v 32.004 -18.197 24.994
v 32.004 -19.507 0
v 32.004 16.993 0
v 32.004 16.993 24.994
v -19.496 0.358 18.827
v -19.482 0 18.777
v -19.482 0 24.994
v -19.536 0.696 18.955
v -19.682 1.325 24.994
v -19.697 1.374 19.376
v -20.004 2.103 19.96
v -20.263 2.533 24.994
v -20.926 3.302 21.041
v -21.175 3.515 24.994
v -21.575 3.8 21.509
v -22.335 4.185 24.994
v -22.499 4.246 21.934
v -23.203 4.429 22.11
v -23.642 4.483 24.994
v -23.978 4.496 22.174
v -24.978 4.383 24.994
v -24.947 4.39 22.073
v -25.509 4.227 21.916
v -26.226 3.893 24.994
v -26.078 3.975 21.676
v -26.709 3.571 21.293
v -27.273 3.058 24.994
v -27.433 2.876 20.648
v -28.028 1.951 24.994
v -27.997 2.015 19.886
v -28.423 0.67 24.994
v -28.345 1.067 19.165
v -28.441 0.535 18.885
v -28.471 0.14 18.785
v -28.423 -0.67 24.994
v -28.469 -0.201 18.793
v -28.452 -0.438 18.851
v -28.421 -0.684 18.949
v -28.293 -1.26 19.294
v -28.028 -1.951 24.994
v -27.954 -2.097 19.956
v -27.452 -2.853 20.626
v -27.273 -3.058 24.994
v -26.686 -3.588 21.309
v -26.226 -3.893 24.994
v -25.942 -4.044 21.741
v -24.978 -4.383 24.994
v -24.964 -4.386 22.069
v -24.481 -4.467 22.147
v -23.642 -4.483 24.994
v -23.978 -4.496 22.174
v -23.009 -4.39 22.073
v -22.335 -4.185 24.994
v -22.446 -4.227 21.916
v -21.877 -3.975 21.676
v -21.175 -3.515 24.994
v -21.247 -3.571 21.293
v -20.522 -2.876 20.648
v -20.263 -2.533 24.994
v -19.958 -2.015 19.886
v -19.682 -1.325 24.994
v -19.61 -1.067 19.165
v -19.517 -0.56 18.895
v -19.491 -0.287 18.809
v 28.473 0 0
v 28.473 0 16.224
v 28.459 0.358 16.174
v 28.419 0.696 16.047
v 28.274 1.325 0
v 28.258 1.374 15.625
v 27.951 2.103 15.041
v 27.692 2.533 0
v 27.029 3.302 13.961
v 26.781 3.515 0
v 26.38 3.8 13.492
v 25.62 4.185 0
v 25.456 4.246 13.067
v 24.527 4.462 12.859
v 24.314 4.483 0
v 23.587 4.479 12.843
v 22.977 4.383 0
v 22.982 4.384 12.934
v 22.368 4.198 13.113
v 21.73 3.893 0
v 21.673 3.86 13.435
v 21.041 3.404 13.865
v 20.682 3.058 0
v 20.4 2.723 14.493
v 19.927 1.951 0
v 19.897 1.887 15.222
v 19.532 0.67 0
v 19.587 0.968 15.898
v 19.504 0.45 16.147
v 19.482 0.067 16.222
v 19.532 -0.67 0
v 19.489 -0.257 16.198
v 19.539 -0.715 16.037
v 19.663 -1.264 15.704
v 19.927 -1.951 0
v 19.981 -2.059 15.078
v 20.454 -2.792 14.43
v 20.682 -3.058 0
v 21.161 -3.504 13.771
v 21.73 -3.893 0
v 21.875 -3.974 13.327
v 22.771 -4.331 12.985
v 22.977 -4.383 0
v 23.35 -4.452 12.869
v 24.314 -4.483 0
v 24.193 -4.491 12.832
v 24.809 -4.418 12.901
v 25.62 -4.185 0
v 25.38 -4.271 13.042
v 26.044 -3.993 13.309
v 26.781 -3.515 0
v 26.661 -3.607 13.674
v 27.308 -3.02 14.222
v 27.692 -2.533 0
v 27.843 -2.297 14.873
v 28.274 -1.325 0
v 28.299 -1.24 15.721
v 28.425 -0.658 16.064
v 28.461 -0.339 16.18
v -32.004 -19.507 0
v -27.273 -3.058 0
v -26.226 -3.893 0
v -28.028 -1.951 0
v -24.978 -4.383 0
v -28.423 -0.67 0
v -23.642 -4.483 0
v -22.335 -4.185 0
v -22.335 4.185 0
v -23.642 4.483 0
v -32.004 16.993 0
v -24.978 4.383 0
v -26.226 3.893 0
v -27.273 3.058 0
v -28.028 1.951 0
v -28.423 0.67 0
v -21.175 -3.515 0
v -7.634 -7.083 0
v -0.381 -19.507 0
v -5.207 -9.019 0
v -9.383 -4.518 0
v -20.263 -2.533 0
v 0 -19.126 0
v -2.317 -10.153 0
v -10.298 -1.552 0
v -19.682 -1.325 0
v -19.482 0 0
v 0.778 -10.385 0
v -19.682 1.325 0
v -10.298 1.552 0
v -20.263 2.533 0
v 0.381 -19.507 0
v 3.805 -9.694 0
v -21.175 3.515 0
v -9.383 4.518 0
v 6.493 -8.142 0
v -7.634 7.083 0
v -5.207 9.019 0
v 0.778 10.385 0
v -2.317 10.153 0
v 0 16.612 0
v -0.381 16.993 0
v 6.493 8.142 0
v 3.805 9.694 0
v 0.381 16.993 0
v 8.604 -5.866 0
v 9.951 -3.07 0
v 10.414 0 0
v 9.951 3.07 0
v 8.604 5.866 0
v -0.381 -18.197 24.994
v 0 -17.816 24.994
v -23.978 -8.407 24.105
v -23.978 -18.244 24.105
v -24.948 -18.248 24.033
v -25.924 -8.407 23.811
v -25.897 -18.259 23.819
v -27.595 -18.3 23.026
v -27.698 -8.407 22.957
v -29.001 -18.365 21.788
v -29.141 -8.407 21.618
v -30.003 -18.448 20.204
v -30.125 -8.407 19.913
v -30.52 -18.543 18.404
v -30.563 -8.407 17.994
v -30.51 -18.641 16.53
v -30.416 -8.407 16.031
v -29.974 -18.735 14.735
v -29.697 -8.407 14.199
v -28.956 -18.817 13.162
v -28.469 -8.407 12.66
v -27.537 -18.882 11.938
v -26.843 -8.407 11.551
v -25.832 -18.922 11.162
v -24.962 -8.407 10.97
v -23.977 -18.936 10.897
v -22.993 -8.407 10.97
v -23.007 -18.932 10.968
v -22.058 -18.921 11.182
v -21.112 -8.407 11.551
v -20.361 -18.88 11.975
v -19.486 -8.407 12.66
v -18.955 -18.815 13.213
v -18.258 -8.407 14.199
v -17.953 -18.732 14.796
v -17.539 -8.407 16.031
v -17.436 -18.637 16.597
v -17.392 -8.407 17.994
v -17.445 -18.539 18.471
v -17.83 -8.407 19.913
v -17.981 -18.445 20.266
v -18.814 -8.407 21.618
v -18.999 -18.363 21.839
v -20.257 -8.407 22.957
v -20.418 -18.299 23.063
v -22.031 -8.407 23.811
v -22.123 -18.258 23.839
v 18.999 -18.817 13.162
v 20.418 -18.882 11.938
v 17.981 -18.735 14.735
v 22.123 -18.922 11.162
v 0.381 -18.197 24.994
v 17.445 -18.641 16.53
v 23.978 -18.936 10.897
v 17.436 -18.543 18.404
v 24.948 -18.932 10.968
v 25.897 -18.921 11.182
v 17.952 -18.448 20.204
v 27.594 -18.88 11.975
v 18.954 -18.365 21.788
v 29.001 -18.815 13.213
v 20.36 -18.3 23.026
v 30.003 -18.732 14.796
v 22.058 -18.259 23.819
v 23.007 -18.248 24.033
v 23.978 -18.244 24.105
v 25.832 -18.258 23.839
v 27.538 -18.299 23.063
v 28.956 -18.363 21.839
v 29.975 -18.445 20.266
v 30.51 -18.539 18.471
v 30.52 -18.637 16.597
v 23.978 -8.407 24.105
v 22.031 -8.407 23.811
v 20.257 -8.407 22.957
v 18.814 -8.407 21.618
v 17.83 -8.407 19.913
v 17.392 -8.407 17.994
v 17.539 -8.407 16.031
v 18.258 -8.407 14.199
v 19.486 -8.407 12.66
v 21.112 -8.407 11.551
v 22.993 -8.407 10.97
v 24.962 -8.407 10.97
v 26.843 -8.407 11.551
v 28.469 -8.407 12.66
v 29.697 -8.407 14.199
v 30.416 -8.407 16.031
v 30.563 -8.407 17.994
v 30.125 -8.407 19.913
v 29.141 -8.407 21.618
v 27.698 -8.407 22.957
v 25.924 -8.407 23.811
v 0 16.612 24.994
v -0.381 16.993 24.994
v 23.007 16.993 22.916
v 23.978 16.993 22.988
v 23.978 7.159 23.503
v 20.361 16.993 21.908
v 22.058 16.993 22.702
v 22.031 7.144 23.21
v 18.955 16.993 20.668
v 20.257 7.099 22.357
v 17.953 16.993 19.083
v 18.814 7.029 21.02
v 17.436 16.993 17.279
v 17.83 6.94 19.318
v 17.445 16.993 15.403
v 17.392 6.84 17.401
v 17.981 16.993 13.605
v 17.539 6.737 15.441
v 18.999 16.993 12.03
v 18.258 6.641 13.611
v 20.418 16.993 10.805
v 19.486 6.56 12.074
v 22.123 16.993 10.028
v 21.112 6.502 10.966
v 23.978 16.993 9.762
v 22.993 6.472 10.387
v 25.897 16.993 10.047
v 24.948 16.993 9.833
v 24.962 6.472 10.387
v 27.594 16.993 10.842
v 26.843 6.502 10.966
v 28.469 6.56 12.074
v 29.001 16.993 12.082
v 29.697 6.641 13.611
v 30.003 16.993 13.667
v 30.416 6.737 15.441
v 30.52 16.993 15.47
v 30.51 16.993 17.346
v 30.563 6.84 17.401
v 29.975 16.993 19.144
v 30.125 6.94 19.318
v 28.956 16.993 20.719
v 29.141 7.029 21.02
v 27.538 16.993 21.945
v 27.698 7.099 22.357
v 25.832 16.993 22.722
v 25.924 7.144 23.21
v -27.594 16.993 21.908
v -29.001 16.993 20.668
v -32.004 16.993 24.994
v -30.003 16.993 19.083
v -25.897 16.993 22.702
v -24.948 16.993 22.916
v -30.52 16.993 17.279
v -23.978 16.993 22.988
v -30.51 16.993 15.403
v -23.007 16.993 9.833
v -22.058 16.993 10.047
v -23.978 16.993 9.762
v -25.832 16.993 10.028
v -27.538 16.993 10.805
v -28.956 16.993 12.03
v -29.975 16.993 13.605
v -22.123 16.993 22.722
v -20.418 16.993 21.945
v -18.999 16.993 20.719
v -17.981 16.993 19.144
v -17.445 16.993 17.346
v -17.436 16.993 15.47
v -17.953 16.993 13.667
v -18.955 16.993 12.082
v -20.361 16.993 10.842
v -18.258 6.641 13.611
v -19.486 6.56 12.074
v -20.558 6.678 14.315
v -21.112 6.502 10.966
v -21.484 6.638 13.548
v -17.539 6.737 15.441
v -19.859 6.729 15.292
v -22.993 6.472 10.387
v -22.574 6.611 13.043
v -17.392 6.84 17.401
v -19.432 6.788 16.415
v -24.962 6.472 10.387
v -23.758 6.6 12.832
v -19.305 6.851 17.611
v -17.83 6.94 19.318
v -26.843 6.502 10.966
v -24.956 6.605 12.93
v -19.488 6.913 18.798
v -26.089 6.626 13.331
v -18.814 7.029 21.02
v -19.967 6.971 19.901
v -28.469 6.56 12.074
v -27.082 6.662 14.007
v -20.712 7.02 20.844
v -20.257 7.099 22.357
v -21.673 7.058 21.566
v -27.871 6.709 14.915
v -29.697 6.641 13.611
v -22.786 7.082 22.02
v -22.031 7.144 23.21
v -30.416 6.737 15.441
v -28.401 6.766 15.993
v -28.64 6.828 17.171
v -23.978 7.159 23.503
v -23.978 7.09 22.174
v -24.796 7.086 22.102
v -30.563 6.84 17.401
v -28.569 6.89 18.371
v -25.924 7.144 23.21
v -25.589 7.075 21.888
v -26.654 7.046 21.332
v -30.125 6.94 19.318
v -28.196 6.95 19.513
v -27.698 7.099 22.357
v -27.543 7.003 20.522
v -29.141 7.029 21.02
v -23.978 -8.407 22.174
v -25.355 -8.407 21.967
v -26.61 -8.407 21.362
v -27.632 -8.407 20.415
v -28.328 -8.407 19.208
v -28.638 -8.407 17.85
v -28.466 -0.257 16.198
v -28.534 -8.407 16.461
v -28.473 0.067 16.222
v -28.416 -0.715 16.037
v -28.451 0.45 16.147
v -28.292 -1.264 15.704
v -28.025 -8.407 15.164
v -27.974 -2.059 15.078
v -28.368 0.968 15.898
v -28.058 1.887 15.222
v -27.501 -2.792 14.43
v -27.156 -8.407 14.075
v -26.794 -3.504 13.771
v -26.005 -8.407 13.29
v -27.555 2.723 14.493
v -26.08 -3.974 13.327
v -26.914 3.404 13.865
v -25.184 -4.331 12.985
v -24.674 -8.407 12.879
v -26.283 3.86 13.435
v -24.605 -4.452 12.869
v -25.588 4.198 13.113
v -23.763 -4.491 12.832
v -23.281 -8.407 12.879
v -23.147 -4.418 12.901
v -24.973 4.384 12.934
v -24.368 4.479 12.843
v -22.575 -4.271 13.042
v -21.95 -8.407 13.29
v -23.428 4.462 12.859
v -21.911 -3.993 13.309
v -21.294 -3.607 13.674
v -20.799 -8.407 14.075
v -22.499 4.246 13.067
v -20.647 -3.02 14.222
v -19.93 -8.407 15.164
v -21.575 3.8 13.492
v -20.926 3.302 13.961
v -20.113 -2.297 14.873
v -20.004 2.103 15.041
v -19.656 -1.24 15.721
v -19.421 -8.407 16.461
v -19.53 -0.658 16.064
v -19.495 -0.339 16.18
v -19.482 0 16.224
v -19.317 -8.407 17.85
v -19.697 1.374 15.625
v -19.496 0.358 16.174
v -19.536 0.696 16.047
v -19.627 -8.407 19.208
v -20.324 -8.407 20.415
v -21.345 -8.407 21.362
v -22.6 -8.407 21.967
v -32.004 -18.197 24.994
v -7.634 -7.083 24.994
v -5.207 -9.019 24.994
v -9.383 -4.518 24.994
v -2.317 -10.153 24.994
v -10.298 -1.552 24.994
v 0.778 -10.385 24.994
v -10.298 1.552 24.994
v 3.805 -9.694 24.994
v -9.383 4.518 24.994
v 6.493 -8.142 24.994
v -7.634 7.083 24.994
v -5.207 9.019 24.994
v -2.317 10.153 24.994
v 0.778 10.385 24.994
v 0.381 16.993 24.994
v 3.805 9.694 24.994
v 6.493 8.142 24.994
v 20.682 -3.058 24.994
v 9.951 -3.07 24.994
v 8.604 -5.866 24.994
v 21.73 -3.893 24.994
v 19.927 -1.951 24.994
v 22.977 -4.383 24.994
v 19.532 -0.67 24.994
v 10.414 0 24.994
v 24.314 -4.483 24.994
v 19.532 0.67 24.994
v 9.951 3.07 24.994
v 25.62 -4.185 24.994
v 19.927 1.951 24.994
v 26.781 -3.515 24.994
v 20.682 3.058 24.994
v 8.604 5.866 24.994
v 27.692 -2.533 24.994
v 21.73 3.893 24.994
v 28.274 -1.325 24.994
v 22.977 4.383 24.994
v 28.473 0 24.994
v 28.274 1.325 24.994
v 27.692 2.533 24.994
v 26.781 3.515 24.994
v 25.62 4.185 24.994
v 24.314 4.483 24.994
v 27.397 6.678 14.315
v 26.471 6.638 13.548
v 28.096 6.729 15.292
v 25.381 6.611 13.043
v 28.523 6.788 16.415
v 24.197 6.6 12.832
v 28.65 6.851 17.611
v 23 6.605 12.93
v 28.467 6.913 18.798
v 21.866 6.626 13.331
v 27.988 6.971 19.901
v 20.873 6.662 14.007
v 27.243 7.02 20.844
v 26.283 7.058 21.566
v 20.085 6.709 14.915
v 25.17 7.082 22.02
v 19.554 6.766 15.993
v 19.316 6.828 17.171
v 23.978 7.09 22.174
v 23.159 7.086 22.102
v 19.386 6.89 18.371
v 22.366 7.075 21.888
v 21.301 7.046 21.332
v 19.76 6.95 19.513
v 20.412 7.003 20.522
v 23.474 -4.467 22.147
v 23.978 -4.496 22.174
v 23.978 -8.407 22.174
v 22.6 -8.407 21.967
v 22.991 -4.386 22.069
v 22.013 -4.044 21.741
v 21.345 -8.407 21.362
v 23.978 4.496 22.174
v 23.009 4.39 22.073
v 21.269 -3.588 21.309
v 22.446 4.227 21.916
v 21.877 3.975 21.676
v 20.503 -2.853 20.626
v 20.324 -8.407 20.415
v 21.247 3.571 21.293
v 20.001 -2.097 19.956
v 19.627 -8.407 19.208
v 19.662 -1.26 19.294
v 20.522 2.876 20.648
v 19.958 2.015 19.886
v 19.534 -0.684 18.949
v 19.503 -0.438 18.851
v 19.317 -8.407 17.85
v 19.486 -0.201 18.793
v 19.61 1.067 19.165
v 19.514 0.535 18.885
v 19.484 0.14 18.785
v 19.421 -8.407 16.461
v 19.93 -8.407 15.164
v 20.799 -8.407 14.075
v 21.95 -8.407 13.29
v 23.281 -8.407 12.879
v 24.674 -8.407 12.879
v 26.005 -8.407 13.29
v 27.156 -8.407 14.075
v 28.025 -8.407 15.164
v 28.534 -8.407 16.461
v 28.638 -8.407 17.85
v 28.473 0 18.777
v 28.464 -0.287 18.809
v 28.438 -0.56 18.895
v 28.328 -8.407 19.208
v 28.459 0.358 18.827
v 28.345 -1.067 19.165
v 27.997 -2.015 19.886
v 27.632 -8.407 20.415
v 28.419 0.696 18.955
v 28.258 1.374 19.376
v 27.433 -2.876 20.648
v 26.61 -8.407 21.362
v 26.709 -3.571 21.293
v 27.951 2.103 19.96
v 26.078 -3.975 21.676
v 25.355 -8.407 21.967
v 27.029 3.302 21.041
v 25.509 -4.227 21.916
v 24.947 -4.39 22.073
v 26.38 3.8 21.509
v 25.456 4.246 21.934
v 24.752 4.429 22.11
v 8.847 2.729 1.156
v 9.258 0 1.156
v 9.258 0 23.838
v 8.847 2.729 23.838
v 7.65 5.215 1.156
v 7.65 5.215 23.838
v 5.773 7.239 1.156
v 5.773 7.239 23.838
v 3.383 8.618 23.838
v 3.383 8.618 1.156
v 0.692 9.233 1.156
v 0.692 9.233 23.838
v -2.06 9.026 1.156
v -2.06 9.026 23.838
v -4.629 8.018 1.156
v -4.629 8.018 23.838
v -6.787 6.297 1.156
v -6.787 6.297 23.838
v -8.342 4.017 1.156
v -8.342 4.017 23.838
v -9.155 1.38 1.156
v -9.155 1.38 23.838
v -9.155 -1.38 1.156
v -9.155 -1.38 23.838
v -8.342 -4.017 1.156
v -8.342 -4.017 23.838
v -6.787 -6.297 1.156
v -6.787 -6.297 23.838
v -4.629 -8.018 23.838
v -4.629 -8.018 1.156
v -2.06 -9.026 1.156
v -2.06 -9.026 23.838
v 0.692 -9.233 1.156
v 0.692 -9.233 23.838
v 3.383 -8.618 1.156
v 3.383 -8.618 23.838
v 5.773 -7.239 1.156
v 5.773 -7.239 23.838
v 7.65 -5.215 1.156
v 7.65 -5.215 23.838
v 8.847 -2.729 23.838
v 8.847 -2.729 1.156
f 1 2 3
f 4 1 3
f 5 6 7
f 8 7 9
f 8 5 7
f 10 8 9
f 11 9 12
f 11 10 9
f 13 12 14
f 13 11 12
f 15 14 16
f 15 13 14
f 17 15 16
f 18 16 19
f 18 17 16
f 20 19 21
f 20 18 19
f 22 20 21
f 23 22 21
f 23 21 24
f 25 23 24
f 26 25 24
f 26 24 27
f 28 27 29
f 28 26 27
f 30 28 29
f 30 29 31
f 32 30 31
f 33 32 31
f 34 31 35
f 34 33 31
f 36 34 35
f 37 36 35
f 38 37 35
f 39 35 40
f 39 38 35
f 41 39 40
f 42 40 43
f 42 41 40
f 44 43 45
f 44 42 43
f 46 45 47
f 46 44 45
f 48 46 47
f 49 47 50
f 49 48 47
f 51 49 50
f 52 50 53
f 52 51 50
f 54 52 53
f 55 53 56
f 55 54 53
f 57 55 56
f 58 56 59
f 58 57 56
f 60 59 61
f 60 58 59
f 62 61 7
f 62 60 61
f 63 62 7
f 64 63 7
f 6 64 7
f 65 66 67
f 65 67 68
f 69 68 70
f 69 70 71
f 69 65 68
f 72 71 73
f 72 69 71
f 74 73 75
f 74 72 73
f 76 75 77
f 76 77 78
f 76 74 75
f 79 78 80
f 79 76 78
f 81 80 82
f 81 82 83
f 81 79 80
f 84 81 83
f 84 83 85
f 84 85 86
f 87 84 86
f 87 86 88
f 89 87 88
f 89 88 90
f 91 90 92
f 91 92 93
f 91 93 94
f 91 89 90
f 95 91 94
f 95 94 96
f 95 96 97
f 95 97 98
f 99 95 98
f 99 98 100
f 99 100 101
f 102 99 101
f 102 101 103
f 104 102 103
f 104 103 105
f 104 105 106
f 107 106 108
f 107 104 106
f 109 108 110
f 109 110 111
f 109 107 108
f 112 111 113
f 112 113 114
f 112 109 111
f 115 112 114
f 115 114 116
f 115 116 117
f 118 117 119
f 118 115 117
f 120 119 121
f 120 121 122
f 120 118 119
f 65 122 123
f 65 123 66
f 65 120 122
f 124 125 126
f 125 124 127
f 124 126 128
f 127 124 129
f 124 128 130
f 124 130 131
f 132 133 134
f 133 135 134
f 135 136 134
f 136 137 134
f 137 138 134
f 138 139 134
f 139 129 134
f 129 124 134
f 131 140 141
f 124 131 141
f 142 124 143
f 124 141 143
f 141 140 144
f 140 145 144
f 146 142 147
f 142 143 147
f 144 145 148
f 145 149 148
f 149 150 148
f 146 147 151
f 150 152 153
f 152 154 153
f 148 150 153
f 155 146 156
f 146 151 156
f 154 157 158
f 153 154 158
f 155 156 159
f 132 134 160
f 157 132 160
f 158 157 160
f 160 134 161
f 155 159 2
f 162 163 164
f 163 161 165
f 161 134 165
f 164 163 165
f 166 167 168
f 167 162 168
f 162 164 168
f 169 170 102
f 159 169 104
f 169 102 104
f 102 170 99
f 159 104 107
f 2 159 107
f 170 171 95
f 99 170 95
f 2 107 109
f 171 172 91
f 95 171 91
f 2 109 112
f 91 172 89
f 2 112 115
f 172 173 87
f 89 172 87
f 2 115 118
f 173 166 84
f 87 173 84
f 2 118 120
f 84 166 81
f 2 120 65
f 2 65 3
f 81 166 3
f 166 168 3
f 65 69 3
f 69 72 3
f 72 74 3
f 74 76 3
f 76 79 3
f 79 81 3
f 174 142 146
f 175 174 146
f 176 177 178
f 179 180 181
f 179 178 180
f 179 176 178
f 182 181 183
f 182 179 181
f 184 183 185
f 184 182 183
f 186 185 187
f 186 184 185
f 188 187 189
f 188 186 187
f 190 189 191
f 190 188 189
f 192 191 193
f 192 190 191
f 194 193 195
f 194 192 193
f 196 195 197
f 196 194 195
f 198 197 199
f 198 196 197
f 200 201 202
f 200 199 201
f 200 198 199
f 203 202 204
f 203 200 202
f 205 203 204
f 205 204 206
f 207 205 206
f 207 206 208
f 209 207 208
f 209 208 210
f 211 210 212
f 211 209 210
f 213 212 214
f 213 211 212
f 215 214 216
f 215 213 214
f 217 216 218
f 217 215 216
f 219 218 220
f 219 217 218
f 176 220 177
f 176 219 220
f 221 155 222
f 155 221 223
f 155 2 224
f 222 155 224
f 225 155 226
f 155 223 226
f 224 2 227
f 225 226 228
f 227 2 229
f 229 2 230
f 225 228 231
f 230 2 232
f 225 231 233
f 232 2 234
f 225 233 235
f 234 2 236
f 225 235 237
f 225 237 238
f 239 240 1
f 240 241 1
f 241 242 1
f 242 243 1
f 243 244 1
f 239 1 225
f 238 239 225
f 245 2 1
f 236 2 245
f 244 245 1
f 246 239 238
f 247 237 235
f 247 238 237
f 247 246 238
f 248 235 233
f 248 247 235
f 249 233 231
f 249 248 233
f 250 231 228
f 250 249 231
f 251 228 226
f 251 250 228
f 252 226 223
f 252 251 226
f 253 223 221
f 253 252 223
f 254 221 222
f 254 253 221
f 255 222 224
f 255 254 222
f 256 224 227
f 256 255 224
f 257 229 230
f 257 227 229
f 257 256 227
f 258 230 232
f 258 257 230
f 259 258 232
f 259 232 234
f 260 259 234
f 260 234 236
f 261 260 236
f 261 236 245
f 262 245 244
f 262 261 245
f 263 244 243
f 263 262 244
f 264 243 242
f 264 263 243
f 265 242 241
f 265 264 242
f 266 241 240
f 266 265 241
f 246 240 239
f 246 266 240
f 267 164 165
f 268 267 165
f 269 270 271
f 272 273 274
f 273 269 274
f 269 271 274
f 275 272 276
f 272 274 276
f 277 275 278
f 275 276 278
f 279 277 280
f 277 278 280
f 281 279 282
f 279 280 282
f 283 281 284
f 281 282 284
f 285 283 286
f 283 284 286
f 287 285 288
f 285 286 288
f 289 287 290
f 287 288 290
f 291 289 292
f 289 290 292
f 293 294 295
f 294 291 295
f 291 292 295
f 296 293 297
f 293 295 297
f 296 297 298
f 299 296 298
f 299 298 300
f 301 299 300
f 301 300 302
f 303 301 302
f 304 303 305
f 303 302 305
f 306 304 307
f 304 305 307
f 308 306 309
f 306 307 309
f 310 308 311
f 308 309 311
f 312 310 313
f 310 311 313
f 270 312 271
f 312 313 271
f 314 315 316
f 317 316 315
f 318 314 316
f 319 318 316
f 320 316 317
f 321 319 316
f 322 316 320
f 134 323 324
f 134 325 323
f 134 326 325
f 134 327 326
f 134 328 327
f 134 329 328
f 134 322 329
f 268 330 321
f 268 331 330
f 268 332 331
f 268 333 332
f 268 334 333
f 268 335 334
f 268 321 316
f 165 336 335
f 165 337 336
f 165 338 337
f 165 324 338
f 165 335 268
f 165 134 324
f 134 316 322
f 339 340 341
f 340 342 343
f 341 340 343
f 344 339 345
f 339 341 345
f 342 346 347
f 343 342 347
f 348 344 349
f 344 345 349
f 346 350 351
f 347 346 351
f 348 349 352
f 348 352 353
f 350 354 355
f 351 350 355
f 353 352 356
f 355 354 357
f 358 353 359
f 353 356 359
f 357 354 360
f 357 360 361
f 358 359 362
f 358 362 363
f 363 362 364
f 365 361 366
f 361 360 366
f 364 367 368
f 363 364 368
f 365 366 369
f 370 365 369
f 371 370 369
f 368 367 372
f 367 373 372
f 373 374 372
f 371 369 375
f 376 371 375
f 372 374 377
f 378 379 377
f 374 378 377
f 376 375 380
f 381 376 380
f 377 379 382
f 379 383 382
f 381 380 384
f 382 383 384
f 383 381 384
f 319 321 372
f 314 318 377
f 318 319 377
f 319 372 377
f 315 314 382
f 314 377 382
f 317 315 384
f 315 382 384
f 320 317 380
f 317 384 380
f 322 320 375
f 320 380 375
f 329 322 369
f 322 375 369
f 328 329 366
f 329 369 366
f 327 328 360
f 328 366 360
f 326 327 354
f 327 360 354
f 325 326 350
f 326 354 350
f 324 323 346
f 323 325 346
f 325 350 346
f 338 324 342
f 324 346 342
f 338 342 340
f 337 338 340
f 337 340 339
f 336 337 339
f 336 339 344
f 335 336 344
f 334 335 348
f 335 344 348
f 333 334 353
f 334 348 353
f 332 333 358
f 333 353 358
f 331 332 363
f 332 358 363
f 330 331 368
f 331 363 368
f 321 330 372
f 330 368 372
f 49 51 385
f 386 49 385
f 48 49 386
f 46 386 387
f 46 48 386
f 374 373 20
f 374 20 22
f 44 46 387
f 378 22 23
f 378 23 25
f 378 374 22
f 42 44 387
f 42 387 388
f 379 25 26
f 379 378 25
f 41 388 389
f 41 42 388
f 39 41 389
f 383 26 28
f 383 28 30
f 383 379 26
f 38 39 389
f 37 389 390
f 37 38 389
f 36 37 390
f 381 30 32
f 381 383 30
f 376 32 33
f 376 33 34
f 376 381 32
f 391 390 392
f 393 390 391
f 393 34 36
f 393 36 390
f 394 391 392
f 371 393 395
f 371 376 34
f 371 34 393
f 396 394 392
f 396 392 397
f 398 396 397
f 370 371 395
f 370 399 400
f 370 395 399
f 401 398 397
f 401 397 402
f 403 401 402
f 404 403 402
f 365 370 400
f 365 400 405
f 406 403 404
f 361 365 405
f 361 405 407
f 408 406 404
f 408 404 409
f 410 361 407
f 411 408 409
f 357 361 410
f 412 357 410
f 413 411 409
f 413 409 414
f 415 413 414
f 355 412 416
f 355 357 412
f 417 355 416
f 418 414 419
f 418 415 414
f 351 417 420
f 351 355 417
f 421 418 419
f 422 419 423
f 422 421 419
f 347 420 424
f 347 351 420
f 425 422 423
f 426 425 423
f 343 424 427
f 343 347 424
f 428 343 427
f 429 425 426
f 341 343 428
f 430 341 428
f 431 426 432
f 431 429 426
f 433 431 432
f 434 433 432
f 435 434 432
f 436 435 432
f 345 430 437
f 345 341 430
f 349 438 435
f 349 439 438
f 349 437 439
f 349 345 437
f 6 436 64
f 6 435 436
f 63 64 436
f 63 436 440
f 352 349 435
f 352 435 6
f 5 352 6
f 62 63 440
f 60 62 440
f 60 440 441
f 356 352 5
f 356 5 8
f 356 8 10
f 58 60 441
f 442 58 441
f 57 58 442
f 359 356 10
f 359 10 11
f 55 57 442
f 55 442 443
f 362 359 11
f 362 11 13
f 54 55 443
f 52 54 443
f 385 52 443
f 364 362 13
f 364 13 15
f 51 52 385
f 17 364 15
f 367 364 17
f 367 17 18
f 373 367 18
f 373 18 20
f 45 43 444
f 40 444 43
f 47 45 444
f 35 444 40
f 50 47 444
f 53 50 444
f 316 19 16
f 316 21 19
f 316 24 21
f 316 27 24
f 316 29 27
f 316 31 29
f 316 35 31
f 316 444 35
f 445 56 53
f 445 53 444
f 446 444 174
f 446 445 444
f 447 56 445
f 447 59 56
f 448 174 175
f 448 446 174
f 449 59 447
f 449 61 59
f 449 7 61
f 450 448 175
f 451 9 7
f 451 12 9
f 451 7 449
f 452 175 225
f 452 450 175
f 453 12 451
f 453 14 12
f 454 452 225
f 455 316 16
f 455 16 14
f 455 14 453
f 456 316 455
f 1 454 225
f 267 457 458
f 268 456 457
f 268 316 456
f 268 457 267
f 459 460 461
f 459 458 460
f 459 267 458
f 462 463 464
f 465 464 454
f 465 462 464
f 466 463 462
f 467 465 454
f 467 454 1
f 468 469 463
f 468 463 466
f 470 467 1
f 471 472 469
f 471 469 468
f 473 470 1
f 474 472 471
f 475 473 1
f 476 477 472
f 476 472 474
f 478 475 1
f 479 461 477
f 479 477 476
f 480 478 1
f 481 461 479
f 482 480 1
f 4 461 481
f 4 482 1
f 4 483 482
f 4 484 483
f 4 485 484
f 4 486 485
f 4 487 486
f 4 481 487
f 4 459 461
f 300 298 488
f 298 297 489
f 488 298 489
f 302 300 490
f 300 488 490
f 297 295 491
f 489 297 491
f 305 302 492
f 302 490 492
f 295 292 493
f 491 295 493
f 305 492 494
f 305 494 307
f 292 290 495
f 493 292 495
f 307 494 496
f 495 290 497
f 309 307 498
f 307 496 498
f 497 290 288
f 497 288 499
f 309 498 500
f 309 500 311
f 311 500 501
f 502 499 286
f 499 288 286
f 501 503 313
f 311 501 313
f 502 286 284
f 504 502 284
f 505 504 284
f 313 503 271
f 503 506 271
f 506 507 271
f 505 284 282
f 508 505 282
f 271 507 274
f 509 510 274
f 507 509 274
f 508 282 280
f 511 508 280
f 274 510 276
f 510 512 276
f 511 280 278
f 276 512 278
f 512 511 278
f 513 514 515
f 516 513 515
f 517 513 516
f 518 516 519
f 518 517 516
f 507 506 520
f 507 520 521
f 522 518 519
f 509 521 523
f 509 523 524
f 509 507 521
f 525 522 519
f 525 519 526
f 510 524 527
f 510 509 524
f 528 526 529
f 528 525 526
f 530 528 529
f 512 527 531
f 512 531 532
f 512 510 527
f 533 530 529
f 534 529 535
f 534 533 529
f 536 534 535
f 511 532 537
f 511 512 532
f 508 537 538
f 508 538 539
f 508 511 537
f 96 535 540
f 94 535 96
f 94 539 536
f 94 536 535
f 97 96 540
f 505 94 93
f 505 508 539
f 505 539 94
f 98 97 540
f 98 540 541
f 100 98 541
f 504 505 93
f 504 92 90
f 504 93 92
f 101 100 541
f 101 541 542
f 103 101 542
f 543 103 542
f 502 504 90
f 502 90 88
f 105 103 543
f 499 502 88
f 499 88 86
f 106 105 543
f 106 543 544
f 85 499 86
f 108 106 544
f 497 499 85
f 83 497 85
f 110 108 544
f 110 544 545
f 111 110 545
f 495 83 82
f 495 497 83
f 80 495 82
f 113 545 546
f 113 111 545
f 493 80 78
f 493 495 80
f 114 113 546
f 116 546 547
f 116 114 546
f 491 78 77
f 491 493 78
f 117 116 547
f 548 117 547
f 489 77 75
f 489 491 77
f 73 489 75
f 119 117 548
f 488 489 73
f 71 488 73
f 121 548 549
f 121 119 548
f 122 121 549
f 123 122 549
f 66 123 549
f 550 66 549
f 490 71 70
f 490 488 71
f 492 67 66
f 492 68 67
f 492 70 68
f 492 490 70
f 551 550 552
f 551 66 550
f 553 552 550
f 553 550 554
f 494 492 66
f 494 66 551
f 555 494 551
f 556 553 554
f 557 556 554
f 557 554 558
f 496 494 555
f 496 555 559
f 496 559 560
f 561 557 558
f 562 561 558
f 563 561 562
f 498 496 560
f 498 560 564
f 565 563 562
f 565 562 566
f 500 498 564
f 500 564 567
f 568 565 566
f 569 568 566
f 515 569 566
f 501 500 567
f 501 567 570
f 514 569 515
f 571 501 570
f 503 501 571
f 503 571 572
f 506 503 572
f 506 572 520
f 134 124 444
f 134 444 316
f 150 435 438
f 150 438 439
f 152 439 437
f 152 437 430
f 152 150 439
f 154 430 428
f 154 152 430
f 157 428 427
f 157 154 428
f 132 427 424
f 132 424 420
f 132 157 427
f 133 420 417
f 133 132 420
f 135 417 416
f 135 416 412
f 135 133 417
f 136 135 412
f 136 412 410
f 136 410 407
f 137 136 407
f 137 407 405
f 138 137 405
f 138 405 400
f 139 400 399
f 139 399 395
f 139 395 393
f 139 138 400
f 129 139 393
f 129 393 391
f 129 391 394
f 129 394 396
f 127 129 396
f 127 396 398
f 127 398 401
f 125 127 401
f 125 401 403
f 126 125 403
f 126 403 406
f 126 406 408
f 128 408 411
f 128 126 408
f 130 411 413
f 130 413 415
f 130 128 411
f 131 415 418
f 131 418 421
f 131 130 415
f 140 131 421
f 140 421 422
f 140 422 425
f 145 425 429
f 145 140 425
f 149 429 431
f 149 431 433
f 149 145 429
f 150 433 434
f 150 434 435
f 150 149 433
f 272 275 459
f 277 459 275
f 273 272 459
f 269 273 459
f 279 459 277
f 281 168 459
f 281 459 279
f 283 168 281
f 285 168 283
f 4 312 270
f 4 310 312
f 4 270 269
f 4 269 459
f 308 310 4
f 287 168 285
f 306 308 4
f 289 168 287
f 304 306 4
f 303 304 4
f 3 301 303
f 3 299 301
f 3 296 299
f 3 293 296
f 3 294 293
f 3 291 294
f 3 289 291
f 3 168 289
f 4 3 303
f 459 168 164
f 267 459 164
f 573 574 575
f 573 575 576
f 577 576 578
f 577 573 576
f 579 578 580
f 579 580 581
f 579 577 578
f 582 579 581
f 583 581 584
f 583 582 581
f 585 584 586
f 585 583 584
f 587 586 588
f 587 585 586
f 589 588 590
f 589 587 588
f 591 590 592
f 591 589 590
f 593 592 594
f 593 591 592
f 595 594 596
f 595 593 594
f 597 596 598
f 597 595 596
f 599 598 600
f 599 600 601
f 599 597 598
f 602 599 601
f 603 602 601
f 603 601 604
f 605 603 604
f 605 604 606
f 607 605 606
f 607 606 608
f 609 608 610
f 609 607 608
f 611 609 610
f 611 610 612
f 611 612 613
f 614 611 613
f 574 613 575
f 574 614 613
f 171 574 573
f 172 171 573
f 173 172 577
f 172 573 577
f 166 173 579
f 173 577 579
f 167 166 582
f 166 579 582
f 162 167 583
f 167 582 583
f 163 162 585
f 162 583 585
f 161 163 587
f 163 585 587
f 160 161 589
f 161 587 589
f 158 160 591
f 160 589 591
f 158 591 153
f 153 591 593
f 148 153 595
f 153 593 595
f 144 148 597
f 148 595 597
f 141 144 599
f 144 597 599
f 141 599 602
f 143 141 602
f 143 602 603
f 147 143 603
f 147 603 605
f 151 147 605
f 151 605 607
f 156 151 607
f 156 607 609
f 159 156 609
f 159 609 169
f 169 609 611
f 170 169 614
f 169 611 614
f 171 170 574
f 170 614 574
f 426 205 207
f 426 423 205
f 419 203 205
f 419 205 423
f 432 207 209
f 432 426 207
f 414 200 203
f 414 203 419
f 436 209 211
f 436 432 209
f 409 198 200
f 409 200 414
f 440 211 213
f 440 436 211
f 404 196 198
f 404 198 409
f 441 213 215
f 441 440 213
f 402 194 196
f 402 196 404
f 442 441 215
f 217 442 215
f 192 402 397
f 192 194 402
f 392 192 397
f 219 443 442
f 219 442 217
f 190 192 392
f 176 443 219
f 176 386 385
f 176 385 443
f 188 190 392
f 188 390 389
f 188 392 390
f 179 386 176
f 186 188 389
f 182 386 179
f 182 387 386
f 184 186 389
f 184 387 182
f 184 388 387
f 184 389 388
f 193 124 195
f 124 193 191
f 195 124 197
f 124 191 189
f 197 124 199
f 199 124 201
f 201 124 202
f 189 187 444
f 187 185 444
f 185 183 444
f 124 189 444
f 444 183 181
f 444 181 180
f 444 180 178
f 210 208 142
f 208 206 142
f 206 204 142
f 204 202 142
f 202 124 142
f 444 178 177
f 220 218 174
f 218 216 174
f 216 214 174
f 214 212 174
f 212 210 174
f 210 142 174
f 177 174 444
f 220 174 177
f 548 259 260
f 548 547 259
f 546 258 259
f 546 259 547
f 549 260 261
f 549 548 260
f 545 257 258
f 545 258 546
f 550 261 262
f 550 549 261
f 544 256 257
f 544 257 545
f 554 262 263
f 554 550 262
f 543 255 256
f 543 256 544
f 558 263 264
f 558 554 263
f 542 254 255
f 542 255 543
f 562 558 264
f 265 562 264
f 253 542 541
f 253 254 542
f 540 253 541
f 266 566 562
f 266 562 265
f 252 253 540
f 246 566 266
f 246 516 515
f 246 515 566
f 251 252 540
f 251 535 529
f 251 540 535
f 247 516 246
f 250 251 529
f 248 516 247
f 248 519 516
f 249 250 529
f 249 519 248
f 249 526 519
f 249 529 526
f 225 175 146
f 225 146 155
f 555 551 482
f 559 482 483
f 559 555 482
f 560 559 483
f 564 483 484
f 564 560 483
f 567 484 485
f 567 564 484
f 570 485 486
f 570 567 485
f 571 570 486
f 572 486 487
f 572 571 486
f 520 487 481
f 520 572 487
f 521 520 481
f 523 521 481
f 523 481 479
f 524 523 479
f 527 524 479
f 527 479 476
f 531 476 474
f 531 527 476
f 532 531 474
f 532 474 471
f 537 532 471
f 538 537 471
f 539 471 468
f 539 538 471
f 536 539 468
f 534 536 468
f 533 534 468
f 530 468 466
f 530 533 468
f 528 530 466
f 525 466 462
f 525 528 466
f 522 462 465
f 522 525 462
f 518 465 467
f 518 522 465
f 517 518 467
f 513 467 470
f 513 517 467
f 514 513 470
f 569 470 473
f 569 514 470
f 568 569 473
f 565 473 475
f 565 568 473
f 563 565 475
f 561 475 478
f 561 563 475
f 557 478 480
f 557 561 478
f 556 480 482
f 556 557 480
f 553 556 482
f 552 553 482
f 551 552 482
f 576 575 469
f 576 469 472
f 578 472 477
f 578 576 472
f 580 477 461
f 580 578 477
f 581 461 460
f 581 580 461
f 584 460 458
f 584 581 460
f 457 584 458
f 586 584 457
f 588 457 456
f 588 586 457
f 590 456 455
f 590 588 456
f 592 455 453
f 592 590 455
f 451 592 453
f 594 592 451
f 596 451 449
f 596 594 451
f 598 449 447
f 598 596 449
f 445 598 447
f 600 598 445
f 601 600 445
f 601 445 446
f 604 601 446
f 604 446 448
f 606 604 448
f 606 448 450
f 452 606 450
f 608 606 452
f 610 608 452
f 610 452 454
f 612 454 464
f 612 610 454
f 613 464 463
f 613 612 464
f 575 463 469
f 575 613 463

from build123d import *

# Parameters (mm, degrees)
SKETCH1_W          = 64.008
SKETCH1_H          = 36.4998
SKETCH1_R          = 9.2585
SKETCH1_R_2        = 4.4958
EXTRUDE1_DEPTH     = 24.9936
CUT_EXTRUDE1_DEPTH = 65.008
LPATTERN1_COUNT    = 2
LPATTERN1_PITCH    = 47.9552
CHAMFER1_SIZE      = 1.1555
CUT_EXTRUDE2_DEPTH = 25.9936001
CUT_EXTRUDE3_DEPTH = 27.869599175


with BuildPart() as part:
    # Sketch1 → Extrude1 (new body)
    with BuildSketch(Plane.XY):
        with Locations((0, -1.2573)):
            Rectangle(SKETCH1_W, SKETCH1_H)
        Circle(SKETCH1_R, mode=Mode.SUBTRACT)
        with Locations((-23.9776, 0)):
            Circle(SKETCH1_R_2, mode=Mode.SUBTRACT)
        with Locations((23.9776, 0)):
            Circle(SKETCH1_R_2, mode=Mode.SUBTRACT)
    extrude(amount=EXTRUDE1_DEPTH)

    # Sketch2 → Cut-Extrude1 (cut, through all)
    with BuildSketch(Plane(origin=(32.004, 0, 0), x_dir=(0, 0, -1), z_dir=(1, 0, 0))):
        Polygon((0, -19.5072), (-24.9936, -18.197340928), (-24.9936, -19.5072), align=None)
    extrude(amount=-CUT_EXTRUDE1_DEPTH, mode=Mode.SUBTRACT)

    # Sketch3 → Cut-Revolve1 (revolve, cut)
    with BuildSketch(Plane(origin=(-23.9776, 0, 0), x_dir=(0, 0, -1), z_dir=(1, 0, 0)), mode=Mode.PRIVATE) as cut_revolve1_sk:
        Polygon((-10.8966, -18.936133392), (-10.8966, -8.4074), (-12.827, -8.4074), (-12.827, 16.9926), (-17.5006, 16.9926), (-17.5006, -18.936133392), align=None)
    cut_revolve1 = revolve(cut_revolve1_sk.sketch.rotate(Axis((-23.9776, 16.931830478, 17.5006), (0, -1, 0)), 180), axis=Axis((-23.9776, 16.931830478, 17.5006), (0, -1, 0)), mode=Mode.SUBTRACT)  # turned: the seam where the file's is

    # Sketch4 → Cut-Revolve2 (revolve, cut)
    with BuildSketch(Plane(origin=(-23.9776, 0, 0), x_dir=(0, 0, -1), z_dir=(1, 0, 0)), mode=Mode.PRIVATE) as cut_revolve2_sk:
        Polygon((-9.761726171, 16.9926), (-10.313289005, 6.468154162), (-16.908238453, 6.813780817), (-16.356675618, 17.338226655), align=None)
    cut_revolve2 = revolve(cut_revolve2_sk.sketch.rotate(Axis((-23.9776, 21.413064128, 16.143122435), (0, -0.998629535, 0.052335956)), 180), axis=Axis((-23.9776, 21.413064128, 16.143122435), (0, -0.998629535, 0.052335956)), mode=Mode.SUBTRACT)  # turned: the seam where the file's is

    # LPattern1: Cut-Revolve1, Cut-Revolve2 ×2
    with Locations(*[(i * LPATTERN1_PITCH, 0, 0) for i in range(1, LPATTERN1_COUNT)]):
        add(cut_revolve1, mode=Mode.SUBTRACT)
        add(cut_revolve2, mode=Mode.SUBTRACT)

    # Chamfer1
    chamfer1_edges = [part.edges().sort_by_distance(p)[0] for p in [
        (-9.2585, 0, 0),
        (-9.2585, 0, 24.9936),
    ]]
    chamfer(chamfer1_edges, length=CHAMFER1_SIZE)

    # Sketch5 → Cut-Extrude2 (cut, through all)
    with BuildSketch(Plane(origin=(0, 0, 0), x_dir=(-1, 0, 0), z_dir=(0, 0, -1))):
        Polygon((-0.381, 16.9926), (0, 16.6116), (0.381, 16.9926), align=None)
    extrude(amount=-CUT_EXTRUDE2_DEPTH, mode=Mode.SUBTRACT)

    # Sketch6 → Cut-Extrude3 (cut, through all)
    with BuildSketch(Plane(origin=(0, -0.053431241, -1.019528819), x_dir=(-1, 0, 0), z_dir=(0, -0.052335956, -0.998629535))):
        Polygon((0.381, -19.48046606), (0, -19.09946606), (-0.381, -19.48046606), align=None)
    extrude(amount=-CUT_EXTRUDE3_DEPTH, mode=Mode.SUBTRACT)


solid = part.part
